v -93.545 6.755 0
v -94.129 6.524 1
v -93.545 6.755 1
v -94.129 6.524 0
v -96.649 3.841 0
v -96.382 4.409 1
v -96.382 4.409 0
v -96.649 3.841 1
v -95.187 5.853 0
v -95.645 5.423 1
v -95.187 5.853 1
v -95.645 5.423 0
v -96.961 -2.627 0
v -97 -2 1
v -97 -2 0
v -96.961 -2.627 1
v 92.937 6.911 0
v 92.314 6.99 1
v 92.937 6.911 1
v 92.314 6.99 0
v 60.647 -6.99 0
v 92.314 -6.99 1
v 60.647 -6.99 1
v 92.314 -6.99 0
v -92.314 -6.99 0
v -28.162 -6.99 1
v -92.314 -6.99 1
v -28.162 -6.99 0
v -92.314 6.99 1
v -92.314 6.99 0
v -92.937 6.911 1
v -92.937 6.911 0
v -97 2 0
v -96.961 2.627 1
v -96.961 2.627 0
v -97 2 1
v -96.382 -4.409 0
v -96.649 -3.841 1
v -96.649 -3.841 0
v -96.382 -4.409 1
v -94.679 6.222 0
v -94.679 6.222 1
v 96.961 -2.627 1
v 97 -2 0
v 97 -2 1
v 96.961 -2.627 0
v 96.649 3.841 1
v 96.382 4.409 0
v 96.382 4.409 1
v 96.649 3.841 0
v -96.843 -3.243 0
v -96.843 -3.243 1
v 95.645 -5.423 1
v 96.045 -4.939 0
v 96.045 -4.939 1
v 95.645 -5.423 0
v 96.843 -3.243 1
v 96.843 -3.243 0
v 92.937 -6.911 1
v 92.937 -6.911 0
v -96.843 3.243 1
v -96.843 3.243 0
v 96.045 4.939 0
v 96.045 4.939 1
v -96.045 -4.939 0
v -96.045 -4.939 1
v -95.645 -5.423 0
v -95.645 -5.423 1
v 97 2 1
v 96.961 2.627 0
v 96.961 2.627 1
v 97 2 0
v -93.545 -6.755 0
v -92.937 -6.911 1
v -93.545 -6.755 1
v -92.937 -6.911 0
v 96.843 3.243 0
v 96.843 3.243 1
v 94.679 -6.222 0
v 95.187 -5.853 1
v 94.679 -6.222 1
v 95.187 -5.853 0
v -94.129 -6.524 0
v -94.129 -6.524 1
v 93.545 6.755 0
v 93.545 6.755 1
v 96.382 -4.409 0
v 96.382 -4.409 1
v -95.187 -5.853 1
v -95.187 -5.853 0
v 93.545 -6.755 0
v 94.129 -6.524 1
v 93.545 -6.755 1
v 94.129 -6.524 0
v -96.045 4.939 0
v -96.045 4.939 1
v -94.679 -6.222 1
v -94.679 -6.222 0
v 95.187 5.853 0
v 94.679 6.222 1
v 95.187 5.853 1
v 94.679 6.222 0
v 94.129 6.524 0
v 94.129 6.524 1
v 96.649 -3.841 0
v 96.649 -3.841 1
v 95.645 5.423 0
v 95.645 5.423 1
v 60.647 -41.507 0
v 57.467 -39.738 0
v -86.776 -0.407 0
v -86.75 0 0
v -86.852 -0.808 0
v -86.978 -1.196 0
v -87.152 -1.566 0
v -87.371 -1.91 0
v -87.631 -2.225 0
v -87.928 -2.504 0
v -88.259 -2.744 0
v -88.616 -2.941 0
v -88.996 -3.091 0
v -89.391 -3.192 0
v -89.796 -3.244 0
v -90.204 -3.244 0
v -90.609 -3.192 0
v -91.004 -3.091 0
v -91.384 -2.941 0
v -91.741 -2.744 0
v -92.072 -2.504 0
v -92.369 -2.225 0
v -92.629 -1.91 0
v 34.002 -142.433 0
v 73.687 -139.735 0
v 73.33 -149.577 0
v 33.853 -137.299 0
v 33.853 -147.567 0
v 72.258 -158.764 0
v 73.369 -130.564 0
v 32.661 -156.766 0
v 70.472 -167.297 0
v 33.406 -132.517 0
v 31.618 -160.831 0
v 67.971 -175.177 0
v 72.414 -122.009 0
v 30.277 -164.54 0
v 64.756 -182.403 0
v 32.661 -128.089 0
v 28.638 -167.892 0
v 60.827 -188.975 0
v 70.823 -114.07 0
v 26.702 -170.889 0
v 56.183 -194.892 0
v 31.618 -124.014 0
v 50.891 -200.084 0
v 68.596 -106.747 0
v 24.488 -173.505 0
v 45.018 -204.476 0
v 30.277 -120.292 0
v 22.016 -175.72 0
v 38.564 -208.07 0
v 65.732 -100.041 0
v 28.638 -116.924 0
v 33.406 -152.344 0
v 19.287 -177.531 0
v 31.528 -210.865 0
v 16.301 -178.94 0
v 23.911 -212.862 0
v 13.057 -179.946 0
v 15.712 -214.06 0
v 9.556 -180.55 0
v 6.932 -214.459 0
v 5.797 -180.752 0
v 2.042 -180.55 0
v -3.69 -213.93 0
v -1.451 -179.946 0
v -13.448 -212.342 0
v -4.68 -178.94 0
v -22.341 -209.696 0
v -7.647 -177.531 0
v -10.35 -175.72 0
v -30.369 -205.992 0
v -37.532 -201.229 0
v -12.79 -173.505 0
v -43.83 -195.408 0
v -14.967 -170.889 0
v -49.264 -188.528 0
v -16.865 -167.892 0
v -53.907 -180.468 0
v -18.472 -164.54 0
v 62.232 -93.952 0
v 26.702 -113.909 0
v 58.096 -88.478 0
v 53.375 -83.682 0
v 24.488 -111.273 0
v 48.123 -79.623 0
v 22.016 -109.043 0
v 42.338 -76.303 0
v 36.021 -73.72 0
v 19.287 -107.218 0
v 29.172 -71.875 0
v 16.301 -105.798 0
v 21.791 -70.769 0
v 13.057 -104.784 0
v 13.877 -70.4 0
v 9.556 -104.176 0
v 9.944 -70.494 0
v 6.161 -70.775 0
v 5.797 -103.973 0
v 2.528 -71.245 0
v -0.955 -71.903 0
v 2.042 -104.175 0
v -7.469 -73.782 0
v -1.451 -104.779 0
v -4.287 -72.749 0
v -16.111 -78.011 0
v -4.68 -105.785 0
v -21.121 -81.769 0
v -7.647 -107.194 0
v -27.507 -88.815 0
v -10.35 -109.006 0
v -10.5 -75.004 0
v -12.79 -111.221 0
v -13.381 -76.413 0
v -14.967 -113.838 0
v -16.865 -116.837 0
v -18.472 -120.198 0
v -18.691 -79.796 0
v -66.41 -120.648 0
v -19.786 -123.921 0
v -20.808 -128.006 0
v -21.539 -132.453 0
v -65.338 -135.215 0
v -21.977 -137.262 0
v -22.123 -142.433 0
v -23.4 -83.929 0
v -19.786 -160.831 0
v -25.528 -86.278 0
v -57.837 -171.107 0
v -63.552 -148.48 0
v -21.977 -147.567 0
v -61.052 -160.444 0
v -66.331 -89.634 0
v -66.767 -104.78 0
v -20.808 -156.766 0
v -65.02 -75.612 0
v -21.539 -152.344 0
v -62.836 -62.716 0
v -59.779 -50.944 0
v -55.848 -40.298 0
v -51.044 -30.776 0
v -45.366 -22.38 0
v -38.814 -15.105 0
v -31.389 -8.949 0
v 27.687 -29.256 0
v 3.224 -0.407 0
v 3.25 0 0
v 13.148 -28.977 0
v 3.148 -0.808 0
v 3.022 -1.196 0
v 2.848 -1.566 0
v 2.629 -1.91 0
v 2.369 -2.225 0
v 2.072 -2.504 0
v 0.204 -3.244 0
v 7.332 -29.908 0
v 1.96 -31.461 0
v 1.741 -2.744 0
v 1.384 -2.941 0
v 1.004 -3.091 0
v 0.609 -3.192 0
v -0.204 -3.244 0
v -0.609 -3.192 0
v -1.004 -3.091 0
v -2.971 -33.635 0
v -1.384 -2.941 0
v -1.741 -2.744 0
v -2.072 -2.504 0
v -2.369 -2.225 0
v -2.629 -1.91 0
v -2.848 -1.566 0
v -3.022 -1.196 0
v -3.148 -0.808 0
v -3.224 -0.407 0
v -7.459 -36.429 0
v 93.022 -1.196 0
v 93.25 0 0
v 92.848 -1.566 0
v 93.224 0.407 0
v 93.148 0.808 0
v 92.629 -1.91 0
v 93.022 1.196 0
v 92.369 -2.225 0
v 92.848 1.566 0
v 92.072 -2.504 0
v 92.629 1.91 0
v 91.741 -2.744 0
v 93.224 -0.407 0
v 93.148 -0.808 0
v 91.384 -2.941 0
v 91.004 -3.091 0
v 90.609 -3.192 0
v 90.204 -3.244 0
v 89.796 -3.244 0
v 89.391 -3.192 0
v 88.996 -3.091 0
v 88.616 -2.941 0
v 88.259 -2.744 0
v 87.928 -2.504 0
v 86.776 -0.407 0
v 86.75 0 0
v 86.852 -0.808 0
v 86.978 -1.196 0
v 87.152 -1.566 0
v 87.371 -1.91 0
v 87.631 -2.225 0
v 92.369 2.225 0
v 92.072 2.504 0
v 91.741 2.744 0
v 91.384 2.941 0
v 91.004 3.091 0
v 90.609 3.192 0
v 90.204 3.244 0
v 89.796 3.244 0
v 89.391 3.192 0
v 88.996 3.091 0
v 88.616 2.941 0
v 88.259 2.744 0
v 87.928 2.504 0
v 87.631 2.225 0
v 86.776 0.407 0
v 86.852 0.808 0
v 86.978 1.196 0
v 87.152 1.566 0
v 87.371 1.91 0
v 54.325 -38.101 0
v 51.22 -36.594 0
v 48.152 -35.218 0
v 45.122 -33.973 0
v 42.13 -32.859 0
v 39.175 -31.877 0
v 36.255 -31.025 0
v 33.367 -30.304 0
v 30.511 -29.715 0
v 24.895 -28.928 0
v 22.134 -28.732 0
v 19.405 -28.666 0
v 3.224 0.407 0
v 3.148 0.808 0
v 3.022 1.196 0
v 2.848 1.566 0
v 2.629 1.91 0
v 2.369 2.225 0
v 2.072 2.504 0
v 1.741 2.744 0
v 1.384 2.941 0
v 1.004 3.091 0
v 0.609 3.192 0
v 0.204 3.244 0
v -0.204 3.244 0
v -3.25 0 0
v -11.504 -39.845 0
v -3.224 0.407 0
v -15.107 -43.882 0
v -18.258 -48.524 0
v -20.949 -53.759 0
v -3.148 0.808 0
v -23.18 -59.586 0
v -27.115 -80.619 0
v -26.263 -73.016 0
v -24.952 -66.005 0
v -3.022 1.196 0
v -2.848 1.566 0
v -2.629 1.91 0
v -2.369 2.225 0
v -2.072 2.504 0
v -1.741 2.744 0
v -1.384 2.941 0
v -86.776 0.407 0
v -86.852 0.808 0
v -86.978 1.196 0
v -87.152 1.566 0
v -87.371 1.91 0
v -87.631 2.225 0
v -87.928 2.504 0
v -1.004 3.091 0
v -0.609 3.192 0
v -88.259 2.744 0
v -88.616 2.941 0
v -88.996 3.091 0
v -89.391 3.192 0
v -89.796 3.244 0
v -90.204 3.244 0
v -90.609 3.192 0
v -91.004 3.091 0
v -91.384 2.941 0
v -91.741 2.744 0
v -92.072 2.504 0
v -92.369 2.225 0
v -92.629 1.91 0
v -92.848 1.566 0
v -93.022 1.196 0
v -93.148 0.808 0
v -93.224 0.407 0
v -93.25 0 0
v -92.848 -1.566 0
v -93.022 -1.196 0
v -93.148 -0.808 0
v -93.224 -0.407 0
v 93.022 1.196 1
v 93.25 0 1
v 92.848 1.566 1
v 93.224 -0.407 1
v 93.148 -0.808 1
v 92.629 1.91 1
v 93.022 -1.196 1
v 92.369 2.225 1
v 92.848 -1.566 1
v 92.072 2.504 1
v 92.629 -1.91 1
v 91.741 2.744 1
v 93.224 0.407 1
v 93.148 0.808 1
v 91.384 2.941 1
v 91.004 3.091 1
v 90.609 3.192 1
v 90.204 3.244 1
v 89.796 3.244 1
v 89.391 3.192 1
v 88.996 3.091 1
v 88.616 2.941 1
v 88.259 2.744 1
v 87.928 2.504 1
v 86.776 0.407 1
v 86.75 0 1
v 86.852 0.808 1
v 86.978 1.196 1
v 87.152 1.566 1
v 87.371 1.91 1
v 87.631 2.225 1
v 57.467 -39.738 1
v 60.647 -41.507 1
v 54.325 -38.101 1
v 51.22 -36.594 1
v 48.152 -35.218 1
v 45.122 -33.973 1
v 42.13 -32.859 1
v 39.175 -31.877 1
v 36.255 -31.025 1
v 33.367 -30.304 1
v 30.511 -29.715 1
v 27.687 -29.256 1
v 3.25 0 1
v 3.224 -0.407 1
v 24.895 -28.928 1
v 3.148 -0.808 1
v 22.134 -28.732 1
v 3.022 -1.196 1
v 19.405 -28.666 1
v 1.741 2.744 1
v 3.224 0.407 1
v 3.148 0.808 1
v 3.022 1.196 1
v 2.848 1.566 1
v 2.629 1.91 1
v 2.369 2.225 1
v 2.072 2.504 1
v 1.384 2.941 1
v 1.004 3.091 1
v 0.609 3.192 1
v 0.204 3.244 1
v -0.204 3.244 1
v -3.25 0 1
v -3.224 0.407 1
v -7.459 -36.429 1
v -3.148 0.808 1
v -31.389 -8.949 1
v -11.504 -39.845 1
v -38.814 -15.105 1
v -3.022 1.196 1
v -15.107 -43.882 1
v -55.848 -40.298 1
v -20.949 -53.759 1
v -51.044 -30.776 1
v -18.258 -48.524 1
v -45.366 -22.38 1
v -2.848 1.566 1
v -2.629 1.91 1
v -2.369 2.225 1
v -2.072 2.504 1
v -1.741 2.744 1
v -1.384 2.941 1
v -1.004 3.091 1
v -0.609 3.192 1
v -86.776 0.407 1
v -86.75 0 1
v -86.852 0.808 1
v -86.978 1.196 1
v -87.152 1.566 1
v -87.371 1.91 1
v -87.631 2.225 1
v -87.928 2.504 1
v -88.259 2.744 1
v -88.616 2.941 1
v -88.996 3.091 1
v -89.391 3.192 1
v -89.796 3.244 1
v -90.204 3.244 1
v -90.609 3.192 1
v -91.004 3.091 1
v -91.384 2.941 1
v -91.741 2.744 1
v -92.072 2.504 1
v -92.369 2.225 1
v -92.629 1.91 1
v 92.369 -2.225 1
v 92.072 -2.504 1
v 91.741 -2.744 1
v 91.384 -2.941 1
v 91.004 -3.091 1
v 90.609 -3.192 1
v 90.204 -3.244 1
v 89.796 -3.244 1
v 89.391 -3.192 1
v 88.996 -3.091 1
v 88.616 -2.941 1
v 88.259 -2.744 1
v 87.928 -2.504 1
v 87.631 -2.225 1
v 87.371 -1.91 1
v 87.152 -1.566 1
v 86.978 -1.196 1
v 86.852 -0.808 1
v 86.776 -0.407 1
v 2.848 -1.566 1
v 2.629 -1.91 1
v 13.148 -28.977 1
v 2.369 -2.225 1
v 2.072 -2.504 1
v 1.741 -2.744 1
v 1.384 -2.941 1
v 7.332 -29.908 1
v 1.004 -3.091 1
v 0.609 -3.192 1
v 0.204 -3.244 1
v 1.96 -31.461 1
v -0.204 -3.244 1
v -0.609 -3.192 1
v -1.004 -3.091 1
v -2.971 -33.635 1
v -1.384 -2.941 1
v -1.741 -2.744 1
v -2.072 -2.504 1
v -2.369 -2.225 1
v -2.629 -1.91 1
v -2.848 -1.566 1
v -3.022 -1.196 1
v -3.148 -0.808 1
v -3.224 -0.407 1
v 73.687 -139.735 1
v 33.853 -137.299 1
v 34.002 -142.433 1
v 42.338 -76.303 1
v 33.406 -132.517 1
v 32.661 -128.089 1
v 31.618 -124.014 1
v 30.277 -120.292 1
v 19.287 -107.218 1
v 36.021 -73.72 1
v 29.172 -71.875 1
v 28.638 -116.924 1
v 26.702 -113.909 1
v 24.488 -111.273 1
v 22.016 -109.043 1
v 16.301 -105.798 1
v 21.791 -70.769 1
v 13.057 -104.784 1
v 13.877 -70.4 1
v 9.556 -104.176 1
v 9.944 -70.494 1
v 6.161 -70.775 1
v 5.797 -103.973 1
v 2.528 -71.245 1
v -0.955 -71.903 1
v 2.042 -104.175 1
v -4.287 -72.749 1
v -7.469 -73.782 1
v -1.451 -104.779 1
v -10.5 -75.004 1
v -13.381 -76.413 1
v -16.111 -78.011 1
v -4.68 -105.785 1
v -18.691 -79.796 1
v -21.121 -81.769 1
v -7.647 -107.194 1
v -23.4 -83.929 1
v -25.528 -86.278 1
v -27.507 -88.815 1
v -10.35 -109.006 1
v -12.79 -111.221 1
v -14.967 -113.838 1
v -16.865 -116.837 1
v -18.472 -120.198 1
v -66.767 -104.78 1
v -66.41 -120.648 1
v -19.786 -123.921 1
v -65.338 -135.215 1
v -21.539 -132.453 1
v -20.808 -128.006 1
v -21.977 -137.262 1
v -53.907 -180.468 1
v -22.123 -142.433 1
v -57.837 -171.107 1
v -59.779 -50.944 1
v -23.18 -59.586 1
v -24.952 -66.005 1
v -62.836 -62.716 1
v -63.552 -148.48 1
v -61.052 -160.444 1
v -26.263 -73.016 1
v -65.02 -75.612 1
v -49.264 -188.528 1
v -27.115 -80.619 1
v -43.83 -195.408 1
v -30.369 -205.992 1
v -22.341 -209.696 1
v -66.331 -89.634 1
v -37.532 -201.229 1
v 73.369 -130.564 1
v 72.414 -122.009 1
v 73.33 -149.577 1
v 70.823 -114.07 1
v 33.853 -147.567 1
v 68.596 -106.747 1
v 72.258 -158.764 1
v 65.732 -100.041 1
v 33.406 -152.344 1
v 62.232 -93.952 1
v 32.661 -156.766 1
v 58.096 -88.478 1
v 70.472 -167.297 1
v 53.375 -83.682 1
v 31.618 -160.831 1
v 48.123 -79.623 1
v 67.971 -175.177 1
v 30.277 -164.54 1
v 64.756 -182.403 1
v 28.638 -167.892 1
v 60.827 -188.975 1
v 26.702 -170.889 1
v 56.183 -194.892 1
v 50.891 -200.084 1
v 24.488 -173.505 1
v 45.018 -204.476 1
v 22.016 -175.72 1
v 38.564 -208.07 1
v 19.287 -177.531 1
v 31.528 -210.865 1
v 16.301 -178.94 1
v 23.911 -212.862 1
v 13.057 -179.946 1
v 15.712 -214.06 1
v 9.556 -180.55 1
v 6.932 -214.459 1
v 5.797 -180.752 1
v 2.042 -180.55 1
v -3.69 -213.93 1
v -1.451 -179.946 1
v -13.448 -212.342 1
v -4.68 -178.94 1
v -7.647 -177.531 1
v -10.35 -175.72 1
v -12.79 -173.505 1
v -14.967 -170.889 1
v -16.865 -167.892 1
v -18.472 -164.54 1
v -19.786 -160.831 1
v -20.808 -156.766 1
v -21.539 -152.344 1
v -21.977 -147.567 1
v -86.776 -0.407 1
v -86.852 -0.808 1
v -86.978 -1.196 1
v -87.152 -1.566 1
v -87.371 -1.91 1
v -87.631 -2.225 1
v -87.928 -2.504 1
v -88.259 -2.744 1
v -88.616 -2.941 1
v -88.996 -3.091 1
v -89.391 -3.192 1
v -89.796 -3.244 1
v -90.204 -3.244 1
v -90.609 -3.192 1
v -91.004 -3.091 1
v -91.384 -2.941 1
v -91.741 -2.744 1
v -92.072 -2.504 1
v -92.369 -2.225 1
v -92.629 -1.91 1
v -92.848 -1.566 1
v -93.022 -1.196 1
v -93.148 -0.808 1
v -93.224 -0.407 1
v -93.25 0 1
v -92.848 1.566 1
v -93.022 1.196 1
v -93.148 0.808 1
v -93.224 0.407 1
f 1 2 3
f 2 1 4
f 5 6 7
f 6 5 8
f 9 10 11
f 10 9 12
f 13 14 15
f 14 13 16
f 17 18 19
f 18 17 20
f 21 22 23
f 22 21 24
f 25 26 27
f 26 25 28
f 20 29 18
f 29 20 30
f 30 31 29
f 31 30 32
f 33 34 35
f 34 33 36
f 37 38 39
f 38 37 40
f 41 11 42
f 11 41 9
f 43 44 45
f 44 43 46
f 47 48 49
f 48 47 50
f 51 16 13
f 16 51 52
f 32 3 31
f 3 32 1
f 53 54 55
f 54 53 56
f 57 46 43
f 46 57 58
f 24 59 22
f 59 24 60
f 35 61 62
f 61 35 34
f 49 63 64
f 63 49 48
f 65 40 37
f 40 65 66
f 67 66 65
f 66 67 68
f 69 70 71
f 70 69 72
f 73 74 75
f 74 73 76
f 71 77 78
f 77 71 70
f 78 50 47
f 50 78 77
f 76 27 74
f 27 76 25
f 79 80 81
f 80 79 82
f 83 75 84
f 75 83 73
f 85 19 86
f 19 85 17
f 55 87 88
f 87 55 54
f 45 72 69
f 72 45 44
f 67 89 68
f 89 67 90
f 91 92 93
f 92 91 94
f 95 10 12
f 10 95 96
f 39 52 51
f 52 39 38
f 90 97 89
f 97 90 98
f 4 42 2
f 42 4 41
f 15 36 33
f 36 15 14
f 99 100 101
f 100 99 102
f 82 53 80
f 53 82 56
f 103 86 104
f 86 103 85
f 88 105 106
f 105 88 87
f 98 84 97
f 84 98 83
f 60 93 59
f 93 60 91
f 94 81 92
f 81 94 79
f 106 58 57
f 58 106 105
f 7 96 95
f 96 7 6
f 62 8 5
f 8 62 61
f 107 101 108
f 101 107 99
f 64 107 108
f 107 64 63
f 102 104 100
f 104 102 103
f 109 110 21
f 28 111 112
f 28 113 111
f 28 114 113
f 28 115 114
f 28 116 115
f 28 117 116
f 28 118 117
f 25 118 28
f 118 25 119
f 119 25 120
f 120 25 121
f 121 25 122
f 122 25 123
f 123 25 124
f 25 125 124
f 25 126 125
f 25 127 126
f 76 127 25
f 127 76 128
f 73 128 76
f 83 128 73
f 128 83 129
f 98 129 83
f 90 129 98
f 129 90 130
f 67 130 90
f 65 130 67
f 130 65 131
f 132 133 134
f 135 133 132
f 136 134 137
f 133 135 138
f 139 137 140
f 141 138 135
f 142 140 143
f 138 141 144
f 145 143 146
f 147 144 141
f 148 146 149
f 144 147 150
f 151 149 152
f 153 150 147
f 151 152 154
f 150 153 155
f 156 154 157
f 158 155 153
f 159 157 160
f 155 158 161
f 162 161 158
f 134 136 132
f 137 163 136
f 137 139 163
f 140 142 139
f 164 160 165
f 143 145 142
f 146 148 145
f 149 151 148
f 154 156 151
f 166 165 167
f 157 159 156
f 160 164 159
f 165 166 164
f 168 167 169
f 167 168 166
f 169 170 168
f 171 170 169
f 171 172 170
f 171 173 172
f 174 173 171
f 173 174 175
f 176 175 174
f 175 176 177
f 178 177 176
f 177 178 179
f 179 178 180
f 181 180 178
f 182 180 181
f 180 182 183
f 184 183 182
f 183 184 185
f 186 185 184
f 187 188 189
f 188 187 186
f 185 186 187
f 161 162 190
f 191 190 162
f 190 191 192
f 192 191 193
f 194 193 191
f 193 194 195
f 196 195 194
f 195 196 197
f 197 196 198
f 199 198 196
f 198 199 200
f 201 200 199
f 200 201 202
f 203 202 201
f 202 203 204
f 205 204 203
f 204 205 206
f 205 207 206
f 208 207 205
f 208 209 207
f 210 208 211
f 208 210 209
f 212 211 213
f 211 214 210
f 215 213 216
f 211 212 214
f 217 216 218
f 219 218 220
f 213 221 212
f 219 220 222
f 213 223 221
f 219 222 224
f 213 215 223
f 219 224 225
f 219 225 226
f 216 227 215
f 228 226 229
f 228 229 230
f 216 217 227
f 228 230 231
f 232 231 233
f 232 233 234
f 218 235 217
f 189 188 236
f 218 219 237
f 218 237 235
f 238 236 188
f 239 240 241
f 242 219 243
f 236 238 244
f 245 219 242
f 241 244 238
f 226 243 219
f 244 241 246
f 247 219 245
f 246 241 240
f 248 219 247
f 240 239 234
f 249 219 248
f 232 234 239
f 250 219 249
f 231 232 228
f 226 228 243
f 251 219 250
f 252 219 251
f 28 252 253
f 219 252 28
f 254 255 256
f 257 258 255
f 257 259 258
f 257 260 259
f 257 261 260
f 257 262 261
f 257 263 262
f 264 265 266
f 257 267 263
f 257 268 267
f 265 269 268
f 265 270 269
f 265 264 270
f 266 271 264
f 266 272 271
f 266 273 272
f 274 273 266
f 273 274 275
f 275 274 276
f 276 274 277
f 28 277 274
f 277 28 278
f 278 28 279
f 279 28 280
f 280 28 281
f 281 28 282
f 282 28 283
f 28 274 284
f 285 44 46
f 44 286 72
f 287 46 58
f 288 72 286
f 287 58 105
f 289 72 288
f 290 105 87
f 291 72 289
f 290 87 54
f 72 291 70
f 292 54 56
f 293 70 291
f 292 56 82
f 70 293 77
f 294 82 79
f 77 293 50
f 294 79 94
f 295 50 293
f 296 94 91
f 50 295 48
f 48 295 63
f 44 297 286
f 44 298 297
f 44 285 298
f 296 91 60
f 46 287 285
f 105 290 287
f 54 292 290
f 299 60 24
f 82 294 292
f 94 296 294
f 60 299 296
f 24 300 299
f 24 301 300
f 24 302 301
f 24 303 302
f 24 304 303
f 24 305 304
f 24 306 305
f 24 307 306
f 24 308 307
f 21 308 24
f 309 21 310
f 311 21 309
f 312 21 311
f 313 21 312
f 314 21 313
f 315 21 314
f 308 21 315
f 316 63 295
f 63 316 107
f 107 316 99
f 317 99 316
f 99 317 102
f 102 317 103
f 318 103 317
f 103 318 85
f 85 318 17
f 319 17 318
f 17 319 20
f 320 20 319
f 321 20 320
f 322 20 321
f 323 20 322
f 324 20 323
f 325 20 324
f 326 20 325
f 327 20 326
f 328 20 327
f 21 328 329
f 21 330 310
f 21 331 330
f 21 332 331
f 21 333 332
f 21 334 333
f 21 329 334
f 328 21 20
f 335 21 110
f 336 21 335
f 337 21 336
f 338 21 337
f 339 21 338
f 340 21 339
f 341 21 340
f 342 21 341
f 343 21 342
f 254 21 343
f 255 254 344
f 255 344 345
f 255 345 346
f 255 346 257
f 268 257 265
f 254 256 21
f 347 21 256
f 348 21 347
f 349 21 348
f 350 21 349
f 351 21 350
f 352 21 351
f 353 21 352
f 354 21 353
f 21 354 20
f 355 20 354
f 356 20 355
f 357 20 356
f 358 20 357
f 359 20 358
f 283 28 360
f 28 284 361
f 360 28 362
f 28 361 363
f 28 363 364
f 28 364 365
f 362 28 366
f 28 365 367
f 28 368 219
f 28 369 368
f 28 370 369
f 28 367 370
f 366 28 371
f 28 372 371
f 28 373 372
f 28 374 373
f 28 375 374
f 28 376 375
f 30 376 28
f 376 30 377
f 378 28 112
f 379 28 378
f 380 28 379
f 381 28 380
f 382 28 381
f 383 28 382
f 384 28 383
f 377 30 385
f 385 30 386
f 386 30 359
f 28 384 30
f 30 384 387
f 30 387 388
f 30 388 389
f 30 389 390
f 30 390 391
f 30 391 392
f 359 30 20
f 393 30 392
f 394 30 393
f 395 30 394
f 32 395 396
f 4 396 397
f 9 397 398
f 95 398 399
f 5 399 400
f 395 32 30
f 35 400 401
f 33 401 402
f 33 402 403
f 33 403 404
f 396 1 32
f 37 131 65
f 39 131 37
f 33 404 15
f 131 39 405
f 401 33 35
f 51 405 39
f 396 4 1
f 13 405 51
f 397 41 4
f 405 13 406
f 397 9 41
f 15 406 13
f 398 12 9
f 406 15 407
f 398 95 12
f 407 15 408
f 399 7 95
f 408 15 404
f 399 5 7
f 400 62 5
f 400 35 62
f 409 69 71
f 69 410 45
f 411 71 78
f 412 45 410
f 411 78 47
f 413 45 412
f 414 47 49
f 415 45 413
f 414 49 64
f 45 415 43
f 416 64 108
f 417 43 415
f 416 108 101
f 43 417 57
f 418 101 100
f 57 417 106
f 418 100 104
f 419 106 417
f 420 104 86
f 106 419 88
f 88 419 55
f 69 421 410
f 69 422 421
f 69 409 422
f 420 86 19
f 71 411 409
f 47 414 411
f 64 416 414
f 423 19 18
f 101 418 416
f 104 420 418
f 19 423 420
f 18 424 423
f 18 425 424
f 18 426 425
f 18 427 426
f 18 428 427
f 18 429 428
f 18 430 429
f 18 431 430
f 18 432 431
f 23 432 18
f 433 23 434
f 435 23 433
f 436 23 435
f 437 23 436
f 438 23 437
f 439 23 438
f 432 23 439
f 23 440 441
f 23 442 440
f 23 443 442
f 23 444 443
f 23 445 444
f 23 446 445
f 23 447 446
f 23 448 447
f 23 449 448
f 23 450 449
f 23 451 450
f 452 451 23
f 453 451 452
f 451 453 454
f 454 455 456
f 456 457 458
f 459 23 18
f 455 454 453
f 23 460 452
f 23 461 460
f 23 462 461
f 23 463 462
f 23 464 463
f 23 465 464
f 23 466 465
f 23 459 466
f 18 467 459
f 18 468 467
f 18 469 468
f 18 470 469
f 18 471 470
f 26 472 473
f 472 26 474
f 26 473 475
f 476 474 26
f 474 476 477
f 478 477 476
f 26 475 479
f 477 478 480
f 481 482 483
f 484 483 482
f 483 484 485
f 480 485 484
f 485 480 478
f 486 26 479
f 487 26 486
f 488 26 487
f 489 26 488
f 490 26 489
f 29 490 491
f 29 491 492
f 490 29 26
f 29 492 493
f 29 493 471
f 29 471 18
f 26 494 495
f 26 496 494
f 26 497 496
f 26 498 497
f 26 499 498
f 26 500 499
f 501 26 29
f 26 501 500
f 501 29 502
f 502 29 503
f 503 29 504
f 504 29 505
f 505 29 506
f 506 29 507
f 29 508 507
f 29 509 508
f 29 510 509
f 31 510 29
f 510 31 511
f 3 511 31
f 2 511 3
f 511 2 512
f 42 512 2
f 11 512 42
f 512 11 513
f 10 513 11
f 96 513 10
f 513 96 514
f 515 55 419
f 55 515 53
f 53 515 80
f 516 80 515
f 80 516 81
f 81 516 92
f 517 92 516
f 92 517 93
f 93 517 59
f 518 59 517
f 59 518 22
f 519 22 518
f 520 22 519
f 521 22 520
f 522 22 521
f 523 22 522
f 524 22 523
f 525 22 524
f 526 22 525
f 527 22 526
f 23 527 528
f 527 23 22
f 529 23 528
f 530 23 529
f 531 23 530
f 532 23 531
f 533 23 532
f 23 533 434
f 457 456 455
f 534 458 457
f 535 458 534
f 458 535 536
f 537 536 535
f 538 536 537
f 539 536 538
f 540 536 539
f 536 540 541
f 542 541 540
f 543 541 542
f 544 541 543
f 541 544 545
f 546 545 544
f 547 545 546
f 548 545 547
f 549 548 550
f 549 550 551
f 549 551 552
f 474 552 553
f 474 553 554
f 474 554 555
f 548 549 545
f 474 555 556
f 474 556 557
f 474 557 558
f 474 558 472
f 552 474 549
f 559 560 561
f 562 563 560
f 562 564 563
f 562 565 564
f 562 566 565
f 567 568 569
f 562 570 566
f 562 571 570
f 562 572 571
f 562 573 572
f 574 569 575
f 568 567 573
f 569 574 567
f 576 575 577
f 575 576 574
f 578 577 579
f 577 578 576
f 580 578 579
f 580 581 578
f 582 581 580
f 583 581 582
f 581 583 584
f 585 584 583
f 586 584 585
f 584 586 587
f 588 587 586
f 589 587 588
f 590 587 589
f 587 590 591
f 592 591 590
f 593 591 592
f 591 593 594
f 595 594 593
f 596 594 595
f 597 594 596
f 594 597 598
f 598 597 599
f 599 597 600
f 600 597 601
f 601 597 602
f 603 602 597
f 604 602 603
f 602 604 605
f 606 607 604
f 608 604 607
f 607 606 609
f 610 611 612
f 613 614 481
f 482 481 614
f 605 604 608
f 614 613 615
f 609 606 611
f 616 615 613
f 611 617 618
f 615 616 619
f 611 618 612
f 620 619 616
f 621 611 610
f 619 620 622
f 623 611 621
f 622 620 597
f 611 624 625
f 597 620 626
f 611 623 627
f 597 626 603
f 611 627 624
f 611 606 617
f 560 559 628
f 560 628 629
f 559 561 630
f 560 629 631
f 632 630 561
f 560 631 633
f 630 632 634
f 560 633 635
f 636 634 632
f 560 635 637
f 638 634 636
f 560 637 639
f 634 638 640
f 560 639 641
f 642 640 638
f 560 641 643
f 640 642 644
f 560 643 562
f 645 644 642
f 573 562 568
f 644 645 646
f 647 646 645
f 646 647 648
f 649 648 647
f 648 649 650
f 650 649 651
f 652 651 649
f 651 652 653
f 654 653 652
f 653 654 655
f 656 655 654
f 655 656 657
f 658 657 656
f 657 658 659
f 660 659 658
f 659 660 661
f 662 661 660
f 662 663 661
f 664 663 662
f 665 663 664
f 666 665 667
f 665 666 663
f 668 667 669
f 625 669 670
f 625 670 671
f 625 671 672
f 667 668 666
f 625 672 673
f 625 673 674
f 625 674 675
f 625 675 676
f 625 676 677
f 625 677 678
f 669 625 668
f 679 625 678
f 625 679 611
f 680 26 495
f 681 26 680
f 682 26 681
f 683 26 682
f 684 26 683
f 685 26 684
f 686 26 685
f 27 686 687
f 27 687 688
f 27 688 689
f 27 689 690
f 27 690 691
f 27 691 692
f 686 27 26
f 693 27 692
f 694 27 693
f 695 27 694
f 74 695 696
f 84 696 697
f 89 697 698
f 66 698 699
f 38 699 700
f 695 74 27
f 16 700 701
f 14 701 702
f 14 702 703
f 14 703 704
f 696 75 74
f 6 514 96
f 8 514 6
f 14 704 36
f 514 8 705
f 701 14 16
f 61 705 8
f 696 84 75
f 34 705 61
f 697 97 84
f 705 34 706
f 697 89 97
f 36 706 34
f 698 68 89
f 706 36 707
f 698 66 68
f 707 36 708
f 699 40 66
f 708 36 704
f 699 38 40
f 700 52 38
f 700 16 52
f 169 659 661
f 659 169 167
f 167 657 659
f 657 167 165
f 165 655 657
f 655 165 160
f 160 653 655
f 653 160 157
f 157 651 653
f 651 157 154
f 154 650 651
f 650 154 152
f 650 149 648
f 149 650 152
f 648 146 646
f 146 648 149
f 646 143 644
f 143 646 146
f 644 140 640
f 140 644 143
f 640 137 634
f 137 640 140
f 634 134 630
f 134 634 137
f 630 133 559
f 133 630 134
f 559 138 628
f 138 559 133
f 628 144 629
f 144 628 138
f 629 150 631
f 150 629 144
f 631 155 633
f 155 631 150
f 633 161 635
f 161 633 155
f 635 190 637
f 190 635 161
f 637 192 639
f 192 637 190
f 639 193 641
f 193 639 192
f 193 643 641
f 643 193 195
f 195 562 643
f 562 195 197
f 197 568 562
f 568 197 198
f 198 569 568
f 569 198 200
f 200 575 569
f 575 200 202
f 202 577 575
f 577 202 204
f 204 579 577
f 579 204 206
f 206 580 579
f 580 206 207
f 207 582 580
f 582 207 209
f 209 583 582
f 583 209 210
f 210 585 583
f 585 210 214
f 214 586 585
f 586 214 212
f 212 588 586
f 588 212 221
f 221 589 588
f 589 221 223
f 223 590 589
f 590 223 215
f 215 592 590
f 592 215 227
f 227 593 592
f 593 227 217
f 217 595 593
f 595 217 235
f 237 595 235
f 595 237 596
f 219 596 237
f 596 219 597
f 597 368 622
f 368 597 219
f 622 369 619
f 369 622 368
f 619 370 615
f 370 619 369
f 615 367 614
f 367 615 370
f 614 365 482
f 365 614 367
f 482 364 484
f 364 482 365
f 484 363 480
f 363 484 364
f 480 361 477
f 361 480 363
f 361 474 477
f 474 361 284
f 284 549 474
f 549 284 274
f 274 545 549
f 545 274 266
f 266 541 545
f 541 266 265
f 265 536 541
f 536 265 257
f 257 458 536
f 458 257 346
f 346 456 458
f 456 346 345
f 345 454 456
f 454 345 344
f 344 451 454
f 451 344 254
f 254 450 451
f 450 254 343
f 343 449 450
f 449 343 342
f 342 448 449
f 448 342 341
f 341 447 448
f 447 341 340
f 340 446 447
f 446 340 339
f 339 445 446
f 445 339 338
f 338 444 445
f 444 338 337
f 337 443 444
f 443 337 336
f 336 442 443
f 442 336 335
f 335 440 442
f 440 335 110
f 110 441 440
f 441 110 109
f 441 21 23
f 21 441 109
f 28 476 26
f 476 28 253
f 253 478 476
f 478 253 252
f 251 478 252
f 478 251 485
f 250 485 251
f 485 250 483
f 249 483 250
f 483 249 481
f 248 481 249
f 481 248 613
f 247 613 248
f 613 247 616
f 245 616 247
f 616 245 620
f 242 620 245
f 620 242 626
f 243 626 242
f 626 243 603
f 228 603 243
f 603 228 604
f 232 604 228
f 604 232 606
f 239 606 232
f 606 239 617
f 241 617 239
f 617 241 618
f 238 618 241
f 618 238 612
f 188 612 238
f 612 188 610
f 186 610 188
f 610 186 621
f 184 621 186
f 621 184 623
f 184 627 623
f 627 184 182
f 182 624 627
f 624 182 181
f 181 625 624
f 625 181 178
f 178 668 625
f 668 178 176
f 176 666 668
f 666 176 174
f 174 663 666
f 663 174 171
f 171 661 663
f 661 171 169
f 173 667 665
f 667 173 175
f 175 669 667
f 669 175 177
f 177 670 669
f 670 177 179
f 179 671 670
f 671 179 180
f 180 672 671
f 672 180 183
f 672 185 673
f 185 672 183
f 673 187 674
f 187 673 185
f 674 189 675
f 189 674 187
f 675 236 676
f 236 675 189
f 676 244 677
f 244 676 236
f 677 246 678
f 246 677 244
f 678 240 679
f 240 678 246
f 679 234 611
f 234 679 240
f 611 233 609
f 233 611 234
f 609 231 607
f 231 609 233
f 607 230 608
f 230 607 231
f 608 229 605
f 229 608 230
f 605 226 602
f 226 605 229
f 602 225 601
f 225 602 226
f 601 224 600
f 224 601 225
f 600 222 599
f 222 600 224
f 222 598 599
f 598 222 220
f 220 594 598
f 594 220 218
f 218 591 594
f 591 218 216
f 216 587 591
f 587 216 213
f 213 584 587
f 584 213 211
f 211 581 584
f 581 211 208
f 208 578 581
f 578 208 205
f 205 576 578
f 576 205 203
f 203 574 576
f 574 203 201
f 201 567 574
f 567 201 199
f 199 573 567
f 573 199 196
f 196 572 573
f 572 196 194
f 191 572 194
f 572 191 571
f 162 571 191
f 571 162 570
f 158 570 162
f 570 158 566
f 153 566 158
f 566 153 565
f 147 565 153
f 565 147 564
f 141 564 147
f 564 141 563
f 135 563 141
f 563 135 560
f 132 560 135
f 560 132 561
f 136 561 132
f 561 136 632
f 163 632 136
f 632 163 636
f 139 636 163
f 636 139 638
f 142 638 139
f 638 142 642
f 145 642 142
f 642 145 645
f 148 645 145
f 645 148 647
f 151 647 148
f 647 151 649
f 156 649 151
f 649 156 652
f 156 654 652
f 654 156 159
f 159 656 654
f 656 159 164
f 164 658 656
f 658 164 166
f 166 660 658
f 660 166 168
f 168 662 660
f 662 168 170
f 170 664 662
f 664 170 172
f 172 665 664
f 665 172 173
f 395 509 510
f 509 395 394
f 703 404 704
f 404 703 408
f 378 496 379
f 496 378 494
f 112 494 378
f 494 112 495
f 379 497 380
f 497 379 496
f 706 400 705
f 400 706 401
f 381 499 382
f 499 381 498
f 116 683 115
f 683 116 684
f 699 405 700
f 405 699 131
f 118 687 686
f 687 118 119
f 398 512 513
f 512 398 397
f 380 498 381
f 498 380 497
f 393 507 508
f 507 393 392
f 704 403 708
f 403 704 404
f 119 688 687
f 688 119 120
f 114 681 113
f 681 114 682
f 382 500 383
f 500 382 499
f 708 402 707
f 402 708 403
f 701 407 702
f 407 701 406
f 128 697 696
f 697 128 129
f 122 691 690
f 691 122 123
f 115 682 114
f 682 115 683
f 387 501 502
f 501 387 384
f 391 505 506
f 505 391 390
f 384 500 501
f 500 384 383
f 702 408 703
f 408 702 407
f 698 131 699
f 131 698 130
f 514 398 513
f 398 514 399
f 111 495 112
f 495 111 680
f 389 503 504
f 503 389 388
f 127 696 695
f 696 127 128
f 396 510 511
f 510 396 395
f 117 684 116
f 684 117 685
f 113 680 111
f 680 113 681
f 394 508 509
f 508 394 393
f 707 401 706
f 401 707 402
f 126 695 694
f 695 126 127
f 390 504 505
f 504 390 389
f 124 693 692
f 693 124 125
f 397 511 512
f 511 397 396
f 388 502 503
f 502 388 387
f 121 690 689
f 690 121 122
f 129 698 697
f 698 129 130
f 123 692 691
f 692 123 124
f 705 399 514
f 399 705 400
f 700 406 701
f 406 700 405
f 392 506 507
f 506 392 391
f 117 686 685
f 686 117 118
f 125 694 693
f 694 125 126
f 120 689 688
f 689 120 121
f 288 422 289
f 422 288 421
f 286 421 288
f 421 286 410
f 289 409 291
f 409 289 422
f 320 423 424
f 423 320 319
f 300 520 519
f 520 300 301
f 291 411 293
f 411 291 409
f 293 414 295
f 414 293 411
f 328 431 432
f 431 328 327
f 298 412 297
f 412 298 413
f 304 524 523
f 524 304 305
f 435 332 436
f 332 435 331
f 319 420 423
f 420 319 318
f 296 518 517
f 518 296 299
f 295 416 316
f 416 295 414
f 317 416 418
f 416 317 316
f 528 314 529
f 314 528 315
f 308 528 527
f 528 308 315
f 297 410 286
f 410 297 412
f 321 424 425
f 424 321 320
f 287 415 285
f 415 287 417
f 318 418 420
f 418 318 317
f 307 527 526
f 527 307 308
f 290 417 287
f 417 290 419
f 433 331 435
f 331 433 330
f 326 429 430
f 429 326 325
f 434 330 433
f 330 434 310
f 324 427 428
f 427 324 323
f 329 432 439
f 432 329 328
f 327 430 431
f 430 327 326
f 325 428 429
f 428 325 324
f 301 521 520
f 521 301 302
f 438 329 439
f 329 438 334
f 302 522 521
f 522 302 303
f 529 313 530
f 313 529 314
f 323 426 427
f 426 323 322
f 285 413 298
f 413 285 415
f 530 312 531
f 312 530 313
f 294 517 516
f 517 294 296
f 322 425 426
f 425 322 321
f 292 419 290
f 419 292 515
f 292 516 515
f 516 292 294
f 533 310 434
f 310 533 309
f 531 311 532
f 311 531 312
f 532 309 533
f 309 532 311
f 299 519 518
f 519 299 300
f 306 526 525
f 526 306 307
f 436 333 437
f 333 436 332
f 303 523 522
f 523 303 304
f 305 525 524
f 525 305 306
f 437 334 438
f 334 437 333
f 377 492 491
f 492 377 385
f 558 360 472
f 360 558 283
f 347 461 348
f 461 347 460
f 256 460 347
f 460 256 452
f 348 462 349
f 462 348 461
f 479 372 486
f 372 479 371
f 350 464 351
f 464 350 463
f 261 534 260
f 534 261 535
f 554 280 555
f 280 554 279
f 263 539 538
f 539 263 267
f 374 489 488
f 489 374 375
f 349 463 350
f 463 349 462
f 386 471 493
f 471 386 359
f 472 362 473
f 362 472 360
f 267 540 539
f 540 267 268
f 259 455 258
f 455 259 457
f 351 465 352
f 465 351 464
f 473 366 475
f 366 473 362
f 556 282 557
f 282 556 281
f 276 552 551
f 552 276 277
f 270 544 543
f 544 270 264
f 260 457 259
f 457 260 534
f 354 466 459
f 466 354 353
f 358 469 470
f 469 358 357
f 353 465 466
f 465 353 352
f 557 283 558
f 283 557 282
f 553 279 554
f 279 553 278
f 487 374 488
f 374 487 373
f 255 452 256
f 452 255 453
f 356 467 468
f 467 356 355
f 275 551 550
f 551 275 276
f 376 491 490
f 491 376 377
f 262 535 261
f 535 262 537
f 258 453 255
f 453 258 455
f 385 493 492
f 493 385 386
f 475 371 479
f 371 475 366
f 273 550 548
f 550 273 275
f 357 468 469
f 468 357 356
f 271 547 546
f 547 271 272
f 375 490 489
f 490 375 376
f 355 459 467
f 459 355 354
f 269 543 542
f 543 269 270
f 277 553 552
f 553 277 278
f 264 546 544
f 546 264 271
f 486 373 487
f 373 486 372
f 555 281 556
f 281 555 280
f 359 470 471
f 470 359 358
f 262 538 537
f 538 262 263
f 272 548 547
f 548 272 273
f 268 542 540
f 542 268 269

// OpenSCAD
$fn = 50;


difference() {
	union() {
		translate(v = [0, 0, 0]) {
			rotate(a = [0, 0, 0]) {
				hull() {
					translate(v = [-92.0000000000, 2.0000000000, 0]) {
						rotate(a = [0, 0, 0]) {
							translate(v = [0, 0, 0]) {
								rotate(a = [0, 0, 0]) {
									cylinder(h = 1, r = 5);
								}
							}
						}
					}
					translate(v = [92.0000000000, 2.0000000000, 0]) {
						rotate(a = [0, 0, 0]) {
							translate(v = [0, 0, 0]) {
								rotate(a = [0, 0, 0]) {
									cylinder(h = 1, r = 5);
								}
							}
						}
					}
					translate(v = [-92.0000000000, -2.0000000000, 0]) {
						rotate(a = [0, 0, 0]) {
							translate(v = [0, 0, 0]) {
								rotate(a = [0, 0, 0]) {
									cylinder(h = 1, r = 5);
								}
							}
						}
					}
					translate(v = [92.0000000000, -2.0000000000, 0]) {
						rotate(a = [0, 0, 0]) {
							translate(v = [0, 0, 0]) {
								rotate(a = [0, 0, 0]) {
									cylinder(h = 1, r = 5);
								}
							}
						}
					}
				}
			}
		}
		translate(v = [0, 0, 0]) {
			rotate(a = [0, 0, 0]) {
				linear_extrude(height = 1) {
					text(font = "DejaVu Sans Mono:style=Bold", halign = "center", size = 209.0000000000, text = "6", valign = "top");
				}
			}
		}
	}
	union() {
		translate(v = [-90.0000000000, 0.0000000000, -125.0000000000]) {
			rotate(a = [0, 0, 0]) {
				cylinder(h = 250, r = 3.2500000000);
			}
		}
		translate(v = [90.0000000000, 0.0000000000, -125.0000000000]) {
			rotate(a = [0, 0, 0]) {
				cylinder(h = 250, r = 3.2500000000);
			}
		}
		translate(v = [90.0000000000, 0.0000000000, -125.0000000000]) {
			rotate(a = [0, 0, 0]) {
				cylinder(h = 250, r = 3.2500000000);
			}
		}
		translate(v = [0, 0, -125.0000000000]) {
			rotate(a = [0, 0, 0]) {
				cylinder(h = 250, r = 3.2500000000);
			}
		}
	}
}
